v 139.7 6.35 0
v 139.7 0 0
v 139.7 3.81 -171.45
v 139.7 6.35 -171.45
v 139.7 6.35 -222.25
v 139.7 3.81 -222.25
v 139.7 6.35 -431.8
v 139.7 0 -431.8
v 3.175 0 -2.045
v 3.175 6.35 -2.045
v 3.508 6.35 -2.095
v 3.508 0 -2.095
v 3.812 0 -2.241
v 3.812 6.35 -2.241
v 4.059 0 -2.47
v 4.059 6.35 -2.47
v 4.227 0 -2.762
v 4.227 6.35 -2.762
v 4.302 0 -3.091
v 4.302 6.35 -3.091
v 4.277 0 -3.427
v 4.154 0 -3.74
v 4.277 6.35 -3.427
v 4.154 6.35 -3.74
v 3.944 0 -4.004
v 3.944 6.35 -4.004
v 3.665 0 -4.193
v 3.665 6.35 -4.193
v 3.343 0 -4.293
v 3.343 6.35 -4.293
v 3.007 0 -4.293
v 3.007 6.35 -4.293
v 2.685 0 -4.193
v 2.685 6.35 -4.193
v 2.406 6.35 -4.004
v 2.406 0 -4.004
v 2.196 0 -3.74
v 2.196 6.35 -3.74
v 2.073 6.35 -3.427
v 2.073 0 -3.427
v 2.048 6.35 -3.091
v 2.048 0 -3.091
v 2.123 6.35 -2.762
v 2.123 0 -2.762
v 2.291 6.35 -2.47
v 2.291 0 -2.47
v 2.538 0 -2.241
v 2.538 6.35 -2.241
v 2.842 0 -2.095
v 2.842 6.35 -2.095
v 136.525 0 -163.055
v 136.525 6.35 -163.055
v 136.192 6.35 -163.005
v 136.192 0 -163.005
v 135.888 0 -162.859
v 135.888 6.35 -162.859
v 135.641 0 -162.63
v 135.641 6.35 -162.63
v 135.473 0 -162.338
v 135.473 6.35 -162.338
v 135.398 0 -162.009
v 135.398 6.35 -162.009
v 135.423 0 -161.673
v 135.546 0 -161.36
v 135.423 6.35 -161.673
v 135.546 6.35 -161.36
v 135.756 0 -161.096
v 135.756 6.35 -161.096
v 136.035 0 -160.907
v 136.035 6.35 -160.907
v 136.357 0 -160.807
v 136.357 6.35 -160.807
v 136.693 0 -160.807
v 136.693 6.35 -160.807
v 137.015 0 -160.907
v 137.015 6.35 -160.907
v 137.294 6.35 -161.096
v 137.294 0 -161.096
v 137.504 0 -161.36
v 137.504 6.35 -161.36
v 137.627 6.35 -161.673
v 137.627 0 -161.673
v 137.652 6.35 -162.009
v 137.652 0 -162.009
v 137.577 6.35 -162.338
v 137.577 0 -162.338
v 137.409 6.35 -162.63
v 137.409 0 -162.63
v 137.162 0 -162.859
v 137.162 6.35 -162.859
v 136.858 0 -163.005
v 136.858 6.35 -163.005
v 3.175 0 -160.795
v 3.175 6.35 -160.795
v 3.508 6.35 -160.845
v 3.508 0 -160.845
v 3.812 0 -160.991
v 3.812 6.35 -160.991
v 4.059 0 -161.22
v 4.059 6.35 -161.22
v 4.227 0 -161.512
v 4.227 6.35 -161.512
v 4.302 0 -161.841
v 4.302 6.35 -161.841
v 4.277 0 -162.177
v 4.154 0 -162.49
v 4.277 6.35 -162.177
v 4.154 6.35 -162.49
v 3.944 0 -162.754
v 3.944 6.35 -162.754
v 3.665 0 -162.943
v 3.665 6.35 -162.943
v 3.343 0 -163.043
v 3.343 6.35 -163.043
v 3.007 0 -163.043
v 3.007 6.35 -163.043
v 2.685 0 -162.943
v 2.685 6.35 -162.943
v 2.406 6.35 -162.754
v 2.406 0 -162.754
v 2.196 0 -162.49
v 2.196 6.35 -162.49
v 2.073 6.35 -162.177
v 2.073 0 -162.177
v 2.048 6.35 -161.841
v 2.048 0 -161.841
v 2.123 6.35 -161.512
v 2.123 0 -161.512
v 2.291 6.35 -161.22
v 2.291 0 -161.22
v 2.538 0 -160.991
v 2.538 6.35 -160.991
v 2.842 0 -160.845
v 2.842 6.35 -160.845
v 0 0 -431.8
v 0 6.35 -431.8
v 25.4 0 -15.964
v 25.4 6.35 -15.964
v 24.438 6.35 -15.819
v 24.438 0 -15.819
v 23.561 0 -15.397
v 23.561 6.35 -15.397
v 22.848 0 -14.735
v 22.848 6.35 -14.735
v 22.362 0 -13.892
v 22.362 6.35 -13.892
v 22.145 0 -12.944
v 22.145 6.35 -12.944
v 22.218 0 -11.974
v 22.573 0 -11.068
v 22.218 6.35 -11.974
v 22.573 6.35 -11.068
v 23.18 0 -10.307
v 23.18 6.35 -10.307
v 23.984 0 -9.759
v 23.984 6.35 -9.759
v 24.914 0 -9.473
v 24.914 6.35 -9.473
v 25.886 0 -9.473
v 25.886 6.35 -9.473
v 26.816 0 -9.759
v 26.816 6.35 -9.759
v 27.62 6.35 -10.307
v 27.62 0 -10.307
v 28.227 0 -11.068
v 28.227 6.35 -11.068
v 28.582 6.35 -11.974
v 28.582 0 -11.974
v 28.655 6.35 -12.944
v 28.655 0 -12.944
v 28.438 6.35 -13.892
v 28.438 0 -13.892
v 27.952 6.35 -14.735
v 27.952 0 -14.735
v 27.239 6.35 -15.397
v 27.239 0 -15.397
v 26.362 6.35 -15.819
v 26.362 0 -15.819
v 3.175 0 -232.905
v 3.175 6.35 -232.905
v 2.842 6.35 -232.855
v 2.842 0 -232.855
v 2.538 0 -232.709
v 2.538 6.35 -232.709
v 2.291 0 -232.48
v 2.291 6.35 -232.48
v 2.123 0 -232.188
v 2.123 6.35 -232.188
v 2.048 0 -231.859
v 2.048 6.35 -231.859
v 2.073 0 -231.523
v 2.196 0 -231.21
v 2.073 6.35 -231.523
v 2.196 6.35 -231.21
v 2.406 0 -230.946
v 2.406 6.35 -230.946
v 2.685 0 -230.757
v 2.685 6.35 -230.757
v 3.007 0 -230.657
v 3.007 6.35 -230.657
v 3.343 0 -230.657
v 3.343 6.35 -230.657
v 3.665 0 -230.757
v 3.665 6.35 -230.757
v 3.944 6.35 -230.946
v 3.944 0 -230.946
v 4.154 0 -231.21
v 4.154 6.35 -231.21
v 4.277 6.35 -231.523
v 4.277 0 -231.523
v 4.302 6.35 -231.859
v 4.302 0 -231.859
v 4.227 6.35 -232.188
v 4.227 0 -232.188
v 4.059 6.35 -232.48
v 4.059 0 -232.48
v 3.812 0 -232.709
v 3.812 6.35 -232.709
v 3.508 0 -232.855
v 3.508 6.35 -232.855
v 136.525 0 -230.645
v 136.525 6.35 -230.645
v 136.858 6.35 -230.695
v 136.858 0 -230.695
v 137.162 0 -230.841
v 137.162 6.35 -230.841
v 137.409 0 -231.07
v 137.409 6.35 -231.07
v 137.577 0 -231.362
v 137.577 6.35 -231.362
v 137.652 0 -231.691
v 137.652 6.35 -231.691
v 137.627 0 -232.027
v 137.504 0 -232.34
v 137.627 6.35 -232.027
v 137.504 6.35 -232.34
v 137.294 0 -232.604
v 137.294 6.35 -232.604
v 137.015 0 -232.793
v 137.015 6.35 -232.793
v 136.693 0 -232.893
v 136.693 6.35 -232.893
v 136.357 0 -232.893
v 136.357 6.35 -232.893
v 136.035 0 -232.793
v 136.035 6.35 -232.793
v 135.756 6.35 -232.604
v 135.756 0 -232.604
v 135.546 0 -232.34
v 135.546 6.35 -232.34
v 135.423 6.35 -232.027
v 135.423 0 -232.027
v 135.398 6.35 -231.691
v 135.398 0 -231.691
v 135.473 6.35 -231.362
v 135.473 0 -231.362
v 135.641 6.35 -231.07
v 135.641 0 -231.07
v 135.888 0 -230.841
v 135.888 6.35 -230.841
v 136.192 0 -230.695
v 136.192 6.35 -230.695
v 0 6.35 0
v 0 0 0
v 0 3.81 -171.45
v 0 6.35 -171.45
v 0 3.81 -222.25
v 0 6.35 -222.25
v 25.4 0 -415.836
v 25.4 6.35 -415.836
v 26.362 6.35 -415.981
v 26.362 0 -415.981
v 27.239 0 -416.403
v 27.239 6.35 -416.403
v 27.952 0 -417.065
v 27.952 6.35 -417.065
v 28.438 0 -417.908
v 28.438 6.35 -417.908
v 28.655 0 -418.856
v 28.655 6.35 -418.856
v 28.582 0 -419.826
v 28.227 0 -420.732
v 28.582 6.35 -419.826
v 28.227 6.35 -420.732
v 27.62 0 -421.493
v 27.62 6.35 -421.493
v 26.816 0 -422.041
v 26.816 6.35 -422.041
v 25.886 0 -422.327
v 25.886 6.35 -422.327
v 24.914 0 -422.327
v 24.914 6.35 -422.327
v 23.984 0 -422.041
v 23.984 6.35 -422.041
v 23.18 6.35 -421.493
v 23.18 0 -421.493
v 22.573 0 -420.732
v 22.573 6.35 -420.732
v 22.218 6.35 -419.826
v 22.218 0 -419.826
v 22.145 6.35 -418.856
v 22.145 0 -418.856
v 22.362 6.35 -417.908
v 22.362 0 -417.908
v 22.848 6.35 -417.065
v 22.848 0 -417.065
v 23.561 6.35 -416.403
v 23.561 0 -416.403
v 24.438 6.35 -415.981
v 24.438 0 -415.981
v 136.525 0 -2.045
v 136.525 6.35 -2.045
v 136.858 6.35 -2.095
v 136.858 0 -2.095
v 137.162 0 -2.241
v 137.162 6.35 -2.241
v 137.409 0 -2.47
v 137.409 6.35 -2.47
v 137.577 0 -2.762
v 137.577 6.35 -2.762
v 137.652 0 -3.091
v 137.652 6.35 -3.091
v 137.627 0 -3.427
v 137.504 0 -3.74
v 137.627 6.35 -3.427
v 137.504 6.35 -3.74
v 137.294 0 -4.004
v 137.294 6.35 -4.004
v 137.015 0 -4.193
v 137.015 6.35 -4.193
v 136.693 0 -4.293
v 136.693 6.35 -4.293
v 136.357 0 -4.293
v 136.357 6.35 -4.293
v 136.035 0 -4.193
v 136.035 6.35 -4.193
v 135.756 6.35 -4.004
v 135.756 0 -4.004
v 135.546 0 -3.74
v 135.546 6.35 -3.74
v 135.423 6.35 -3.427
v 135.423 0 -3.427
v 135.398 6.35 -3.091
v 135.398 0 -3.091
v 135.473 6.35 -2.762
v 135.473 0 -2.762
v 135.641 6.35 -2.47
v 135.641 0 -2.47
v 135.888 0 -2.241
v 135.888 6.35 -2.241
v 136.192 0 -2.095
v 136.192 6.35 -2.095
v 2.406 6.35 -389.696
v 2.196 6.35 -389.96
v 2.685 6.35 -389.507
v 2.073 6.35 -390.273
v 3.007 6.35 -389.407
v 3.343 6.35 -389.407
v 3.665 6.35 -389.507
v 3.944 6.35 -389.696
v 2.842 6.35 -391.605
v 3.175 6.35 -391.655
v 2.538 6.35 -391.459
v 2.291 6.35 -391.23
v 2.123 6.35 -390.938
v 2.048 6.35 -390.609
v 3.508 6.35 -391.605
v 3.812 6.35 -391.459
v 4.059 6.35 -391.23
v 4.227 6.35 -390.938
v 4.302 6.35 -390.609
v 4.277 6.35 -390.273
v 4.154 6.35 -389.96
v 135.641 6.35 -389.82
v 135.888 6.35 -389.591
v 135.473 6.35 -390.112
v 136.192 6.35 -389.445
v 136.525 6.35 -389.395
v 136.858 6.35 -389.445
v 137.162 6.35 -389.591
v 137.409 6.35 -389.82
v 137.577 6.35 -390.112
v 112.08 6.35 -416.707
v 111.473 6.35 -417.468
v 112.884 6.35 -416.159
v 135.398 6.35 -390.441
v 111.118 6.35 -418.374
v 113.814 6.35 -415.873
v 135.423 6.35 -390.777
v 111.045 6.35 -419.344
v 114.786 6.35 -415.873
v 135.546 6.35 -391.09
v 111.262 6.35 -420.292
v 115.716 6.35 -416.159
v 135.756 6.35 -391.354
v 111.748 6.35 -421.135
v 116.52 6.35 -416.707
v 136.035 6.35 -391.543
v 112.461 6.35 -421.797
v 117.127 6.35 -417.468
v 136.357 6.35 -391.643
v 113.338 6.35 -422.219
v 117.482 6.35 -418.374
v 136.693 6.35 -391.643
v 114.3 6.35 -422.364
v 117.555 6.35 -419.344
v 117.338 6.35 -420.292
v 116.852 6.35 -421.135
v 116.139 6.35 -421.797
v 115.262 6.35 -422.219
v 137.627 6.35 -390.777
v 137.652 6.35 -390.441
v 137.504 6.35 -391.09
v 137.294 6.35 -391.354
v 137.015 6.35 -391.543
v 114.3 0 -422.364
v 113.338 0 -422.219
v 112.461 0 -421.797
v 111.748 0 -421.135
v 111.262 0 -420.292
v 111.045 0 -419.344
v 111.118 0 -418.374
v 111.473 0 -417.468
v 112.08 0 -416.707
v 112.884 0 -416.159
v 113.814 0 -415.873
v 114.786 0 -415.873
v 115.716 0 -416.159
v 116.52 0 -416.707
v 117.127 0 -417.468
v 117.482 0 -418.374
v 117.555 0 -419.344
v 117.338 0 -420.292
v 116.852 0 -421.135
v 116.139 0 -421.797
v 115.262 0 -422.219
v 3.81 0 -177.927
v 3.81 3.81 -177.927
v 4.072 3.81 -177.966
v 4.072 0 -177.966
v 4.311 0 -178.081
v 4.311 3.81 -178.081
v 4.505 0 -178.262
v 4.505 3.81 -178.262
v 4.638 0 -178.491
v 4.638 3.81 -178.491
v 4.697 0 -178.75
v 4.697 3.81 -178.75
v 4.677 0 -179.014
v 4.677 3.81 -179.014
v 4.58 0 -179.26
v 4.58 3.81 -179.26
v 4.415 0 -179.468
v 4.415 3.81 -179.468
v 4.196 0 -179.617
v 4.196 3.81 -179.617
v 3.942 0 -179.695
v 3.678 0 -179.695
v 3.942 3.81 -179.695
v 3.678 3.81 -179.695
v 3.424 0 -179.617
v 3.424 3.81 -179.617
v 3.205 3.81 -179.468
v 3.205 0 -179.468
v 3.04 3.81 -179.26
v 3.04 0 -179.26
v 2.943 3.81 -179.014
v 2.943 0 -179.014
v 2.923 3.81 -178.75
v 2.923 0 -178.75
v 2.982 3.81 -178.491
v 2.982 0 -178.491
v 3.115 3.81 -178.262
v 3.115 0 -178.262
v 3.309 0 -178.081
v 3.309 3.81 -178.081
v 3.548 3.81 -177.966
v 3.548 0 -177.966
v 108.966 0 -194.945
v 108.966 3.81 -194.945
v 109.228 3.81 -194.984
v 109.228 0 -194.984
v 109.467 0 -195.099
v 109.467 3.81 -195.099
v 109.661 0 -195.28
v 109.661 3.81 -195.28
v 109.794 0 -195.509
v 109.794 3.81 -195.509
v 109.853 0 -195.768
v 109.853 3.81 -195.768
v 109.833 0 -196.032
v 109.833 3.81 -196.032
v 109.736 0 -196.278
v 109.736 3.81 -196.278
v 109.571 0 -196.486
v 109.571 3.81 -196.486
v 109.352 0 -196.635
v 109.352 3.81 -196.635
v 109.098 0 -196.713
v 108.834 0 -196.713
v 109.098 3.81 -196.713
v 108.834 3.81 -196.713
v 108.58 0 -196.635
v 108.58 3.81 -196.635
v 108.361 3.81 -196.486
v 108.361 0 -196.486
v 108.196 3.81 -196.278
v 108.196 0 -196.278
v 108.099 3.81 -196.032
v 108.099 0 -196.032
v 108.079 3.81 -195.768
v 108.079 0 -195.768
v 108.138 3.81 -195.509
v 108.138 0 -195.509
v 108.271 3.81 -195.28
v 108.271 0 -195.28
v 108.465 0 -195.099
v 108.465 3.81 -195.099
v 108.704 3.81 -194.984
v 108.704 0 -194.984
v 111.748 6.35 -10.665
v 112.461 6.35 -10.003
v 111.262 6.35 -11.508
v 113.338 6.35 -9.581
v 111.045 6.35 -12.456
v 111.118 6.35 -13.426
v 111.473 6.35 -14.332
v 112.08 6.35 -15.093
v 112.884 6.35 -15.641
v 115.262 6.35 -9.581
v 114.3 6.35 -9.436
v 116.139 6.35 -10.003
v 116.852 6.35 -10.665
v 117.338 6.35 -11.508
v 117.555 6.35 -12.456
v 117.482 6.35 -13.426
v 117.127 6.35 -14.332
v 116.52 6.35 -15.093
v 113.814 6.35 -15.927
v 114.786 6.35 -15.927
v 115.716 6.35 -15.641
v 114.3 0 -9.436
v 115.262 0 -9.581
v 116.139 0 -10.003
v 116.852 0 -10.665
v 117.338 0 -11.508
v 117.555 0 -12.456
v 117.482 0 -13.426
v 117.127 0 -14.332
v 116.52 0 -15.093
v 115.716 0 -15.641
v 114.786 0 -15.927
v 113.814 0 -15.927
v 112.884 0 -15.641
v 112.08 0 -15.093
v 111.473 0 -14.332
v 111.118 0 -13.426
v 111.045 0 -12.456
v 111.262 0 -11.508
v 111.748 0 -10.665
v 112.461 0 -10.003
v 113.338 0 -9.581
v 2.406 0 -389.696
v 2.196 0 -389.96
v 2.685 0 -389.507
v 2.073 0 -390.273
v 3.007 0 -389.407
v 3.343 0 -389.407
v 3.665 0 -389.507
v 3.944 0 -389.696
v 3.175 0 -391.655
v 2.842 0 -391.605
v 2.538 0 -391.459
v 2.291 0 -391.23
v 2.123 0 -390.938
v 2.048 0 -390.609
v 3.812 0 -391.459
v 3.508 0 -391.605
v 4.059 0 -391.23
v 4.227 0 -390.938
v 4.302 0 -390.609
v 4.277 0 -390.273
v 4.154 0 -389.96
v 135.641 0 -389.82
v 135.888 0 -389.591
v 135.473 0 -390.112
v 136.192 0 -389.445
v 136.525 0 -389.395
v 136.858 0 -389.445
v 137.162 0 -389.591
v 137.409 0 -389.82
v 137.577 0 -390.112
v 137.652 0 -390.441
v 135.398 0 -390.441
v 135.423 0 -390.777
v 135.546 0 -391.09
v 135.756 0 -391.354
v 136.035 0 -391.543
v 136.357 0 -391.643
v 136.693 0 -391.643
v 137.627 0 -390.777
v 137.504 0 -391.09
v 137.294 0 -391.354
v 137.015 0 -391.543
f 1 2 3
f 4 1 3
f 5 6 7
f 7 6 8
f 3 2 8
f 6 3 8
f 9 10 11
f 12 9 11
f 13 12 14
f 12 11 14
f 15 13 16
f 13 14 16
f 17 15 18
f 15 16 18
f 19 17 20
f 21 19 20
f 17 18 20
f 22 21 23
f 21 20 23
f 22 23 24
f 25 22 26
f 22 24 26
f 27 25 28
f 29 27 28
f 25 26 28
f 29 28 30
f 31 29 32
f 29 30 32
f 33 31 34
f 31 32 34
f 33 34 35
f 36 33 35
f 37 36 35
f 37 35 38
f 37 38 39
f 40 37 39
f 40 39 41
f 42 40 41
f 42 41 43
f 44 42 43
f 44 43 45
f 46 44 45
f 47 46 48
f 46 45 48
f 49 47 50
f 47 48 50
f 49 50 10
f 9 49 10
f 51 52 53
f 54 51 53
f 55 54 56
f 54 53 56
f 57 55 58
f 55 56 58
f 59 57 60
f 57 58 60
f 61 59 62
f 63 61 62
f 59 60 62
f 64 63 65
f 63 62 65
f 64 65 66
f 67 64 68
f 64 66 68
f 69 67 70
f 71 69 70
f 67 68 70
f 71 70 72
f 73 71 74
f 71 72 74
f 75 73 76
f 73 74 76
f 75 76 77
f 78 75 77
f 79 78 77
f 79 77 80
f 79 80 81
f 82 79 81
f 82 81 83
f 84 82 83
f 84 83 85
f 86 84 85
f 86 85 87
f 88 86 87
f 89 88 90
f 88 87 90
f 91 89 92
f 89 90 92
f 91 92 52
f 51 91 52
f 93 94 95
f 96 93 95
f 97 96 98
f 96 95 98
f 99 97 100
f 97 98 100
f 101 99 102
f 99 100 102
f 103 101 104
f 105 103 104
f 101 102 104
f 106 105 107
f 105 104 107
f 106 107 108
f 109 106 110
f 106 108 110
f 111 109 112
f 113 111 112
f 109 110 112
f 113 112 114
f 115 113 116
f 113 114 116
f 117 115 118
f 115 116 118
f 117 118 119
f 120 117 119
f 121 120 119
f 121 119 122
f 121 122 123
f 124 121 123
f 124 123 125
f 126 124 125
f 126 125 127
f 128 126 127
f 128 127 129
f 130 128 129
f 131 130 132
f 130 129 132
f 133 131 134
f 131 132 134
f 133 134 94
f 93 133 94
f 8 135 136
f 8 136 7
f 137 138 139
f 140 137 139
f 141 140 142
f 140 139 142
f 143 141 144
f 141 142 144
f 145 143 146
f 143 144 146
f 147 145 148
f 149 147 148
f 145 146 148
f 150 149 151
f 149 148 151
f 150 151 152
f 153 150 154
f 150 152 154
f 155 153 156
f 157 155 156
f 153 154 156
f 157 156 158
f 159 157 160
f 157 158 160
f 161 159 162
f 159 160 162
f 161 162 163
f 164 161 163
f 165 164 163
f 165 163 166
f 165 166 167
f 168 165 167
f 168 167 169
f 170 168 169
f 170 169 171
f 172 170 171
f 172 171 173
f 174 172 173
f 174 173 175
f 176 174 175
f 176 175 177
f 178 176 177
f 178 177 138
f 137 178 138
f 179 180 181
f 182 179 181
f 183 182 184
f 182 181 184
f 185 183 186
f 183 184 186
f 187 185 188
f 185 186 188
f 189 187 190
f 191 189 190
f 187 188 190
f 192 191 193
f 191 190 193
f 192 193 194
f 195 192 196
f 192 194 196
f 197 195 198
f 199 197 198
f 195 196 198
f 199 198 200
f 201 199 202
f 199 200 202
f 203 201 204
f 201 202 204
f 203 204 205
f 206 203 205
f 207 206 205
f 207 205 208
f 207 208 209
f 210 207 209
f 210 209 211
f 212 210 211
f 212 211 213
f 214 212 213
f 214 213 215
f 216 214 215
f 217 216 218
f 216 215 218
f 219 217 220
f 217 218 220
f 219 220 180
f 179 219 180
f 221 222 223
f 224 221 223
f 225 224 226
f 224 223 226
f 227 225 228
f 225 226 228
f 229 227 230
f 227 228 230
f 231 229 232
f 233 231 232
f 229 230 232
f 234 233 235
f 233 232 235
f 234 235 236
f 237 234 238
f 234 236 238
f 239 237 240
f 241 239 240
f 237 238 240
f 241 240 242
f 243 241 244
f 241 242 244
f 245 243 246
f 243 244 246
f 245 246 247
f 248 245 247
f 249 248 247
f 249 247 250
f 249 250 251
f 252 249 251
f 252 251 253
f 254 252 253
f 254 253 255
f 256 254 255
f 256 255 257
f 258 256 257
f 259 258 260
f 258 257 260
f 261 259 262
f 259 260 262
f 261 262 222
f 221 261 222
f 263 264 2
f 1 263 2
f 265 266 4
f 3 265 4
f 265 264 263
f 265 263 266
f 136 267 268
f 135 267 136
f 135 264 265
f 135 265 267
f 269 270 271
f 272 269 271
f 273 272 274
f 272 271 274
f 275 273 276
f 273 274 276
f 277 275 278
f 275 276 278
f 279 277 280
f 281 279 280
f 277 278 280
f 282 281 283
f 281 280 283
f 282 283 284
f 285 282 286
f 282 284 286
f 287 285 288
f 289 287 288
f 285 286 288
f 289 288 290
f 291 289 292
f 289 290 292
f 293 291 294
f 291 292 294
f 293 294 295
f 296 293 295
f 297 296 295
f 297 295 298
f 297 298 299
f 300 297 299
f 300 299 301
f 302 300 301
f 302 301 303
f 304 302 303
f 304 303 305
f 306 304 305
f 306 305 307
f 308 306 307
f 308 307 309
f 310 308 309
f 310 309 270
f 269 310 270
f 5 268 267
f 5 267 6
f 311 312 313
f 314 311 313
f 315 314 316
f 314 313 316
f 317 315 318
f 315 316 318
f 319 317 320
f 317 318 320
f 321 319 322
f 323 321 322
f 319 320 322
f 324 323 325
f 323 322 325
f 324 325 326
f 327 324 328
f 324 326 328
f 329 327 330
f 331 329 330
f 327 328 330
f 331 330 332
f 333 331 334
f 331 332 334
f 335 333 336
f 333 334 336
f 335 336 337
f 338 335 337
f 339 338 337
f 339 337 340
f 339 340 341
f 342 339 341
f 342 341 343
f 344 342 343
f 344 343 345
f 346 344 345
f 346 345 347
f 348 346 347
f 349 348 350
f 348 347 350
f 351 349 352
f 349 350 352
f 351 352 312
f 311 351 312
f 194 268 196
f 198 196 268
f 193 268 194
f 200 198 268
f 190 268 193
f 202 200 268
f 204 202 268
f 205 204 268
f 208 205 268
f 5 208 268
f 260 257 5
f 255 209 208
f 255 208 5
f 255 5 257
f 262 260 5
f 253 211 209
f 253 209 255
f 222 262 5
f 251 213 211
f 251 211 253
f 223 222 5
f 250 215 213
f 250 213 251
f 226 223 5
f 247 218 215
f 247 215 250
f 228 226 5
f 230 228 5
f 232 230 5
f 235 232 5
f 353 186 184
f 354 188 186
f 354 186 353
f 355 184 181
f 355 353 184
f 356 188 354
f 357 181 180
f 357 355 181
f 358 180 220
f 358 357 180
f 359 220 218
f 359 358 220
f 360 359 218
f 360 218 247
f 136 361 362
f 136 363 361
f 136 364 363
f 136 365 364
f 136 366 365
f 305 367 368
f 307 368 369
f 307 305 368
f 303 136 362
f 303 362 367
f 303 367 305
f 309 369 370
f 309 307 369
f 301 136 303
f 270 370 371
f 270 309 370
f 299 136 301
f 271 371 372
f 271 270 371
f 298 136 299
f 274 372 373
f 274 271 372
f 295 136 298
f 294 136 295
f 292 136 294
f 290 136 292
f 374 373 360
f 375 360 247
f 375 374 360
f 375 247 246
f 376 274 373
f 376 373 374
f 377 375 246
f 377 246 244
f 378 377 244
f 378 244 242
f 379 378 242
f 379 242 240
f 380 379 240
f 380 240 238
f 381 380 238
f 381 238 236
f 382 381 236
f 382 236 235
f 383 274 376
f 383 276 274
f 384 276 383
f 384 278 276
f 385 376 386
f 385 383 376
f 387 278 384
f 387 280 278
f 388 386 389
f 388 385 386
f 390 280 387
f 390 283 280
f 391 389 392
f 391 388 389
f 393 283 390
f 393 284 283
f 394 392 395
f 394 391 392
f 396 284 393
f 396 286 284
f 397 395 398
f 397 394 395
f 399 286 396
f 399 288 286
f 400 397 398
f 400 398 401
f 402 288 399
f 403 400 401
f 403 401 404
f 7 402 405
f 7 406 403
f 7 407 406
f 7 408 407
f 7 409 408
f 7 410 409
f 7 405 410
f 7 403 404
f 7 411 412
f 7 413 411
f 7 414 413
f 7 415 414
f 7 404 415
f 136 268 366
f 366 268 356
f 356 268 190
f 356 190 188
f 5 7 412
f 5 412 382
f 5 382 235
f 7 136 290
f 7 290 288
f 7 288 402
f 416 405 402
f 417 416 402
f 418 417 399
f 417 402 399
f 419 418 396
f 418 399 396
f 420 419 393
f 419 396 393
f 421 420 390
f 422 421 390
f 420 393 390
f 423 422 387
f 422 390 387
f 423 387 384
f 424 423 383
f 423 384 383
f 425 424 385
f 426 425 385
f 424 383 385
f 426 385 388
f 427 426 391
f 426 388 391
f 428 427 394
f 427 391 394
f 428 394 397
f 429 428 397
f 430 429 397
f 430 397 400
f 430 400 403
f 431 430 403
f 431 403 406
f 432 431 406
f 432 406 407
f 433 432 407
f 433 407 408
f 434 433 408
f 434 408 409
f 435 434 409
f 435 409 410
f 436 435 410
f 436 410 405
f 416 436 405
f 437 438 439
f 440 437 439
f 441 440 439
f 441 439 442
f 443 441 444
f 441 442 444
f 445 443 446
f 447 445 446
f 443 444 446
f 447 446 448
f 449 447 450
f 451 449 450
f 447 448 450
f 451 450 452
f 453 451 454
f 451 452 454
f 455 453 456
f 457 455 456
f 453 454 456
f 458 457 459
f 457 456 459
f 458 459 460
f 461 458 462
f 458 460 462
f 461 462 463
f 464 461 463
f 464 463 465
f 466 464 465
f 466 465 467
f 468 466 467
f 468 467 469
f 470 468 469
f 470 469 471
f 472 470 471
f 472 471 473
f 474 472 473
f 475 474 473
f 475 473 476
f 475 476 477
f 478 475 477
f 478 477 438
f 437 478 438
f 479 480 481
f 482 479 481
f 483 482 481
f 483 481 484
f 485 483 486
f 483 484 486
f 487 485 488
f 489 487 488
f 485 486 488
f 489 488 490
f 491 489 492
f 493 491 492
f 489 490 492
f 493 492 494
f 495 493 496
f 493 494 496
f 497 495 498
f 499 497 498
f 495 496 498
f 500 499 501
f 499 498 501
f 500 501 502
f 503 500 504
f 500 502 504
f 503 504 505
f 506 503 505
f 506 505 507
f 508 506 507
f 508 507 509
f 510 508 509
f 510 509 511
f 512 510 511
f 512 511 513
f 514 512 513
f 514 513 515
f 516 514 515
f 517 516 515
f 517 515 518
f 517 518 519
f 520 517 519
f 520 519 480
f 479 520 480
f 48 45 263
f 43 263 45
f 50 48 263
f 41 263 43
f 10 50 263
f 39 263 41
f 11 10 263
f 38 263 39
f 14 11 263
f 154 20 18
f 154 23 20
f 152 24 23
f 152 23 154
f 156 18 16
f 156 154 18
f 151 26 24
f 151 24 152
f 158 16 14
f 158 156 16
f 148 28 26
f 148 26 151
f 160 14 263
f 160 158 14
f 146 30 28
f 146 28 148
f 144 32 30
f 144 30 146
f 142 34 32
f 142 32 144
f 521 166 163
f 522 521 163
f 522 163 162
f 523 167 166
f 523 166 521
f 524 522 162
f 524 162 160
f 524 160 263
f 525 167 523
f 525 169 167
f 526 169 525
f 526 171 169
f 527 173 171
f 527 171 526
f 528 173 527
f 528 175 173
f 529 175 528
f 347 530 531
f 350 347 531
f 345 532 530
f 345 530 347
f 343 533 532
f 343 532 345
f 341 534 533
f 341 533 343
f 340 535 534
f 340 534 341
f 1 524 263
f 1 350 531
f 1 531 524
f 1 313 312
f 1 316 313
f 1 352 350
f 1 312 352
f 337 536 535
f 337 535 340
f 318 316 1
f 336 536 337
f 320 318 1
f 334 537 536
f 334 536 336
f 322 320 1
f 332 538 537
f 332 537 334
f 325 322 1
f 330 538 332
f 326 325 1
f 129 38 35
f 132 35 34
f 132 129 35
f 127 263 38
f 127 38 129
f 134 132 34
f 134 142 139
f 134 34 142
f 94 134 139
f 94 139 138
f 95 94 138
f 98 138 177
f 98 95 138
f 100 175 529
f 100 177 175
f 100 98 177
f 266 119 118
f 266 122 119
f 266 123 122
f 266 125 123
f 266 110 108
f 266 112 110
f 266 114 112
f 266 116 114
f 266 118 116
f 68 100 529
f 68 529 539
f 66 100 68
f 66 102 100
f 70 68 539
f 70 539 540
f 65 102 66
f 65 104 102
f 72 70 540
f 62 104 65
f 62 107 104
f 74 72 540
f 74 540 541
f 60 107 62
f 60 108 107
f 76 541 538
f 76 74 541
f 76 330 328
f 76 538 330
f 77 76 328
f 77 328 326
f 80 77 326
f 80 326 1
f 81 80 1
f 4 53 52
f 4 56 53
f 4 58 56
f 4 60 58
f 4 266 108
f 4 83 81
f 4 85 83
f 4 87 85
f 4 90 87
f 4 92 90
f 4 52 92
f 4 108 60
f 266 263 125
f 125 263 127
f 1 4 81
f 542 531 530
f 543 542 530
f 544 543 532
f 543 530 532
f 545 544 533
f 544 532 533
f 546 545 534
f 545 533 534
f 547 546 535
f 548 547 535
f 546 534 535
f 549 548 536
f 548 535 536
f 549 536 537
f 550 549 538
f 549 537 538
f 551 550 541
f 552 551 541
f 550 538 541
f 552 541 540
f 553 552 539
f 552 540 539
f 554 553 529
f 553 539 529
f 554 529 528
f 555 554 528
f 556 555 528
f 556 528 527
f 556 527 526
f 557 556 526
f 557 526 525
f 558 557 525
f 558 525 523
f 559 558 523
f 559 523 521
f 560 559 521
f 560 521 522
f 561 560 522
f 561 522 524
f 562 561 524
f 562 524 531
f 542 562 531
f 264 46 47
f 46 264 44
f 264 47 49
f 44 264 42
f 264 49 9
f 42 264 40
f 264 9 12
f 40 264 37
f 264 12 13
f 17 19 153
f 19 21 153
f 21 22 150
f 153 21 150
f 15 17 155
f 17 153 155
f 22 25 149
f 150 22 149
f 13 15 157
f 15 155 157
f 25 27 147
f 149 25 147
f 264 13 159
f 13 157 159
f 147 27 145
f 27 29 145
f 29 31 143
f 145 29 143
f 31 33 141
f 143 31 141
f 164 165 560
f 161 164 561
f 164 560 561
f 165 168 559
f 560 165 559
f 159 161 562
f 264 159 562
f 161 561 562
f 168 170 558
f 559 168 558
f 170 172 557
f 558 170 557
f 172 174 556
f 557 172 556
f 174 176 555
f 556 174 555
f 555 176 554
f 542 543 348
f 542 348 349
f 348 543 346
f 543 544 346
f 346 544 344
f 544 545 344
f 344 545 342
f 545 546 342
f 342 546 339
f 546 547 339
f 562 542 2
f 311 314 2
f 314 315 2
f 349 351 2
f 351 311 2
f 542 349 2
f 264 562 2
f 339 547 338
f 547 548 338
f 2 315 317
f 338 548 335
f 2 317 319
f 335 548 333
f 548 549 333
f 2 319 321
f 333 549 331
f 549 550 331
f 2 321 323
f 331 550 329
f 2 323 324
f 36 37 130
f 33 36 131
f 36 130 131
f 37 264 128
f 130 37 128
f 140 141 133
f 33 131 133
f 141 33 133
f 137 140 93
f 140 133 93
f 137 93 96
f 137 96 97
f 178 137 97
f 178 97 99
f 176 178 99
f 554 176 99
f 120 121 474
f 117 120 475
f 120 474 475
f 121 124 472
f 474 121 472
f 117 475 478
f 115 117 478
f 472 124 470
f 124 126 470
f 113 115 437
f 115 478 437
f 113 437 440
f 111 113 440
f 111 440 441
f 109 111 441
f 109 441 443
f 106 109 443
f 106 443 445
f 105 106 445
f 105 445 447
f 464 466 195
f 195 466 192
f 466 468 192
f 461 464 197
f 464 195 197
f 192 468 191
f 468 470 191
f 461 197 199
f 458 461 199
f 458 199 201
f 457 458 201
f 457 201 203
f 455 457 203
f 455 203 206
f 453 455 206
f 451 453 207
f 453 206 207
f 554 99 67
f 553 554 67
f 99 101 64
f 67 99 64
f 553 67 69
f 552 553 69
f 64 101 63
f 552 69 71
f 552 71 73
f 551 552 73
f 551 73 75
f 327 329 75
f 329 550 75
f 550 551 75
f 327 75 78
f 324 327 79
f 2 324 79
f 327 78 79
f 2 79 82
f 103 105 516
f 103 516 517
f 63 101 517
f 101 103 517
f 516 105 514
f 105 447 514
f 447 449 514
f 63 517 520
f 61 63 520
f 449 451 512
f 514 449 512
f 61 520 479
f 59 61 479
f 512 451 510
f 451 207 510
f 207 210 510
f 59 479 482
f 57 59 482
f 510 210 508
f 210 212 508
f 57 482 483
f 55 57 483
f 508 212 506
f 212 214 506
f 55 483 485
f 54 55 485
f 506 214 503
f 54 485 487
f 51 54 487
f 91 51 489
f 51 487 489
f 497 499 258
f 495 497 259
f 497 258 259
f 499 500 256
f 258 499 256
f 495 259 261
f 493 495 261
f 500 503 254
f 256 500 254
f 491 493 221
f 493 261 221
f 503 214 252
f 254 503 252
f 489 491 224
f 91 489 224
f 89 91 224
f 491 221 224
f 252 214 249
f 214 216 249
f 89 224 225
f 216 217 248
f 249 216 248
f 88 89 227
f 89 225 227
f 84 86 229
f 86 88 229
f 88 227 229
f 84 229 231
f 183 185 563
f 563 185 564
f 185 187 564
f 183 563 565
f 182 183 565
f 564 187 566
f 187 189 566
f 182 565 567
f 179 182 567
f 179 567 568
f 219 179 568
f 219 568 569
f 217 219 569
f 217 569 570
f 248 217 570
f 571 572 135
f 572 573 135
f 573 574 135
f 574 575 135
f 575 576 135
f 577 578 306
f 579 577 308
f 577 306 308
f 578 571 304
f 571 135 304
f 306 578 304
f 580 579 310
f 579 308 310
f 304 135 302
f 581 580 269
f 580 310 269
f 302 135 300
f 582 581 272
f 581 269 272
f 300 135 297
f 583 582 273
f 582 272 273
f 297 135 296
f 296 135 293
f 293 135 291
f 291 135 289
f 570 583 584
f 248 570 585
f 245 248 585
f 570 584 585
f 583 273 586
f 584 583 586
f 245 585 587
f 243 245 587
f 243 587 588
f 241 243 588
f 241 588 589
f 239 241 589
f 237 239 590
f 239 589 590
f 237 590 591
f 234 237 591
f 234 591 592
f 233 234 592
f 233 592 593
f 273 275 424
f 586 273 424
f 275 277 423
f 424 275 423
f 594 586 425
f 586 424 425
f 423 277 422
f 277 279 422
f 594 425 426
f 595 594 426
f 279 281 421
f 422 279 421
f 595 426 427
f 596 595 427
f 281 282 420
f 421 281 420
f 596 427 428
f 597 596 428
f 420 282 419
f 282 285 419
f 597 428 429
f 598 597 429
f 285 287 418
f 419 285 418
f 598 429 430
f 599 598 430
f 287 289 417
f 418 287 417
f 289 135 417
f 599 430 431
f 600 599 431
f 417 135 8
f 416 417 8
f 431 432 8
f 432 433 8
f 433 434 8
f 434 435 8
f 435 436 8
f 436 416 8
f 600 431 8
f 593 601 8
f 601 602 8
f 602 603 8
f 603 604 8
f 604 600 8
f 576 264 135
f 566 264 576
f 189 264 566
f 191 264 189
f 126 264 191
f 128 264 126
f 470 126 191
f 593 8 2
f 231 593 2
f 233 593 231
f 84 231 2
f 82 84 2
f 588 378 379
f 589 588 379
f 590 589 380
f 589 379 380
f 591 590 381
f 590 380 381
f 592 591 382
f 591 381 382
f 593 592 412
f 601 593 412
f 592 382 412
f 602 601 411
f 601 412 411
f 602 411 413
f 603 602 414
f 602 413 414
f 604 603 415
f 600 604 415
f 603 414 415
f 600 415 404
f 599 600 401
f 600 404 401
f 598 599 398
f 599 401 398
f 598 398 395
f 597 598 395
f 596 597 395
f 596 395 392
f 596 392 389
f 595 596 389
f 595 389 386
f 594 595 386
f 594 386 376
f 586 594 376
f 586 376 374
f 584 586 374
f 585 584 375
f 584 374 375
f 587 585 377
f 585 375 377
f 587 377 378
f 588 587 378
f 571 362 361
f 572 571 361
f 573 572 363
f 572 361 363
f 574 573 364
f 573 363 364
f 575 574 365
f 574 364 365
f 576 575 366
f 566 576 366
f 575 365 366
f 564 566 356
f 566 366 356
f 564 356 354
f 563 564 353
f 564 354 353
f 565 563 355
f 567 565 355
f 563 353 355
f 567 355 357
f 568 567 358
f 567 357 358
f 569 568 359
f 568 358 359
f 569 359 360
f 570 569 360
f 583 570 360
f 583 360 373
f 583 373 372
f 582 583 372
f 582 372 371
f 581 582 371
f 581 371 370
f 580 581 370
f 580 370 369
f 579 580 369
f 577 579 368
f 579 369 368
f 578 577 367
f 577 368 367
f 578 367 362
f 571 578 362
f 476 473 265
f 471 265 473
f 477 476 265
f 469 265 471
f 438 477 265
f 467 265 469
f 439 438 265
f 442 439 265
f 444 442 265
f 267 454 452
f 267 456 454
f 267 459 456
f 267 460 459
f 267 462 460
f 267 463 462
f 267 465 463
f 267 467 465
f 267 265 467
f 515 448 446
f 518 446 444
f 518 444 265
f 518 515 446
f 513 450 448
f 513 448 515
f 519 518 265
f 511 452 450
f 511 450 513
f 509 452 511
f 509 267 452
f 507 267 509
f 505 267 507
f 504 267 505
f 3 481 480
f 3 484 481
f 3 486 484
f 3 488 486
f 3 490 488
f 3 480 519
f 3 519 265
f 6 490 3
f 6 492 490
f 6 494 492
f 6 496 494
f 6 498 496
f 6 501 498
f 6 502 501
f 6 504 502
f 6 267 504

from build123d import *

# Parameters (mm, degrees)
SKETCH1_W           = 139.7
SKETCH1_H           = 431.8
BOSS_EXTRUDE1_DEPTH = 6.35
SKETCH3_R           = 1.1303
CUT_EXTRUDE6_DEPTH  = 6.35
SKETCH4_W           = 139.7
SKETCH4_H           = 50.8
CUT_EXTRUDE7_DEPTH  = 2.54
SKETCH5_R           = 0.889
CUT_EXTRUDE8_DEPTH  = 454.852229365
SKETCH6_R           = 3.2639
CUT_EXTRUDE9_DEPTH  = 454.880658874


with BuildPart() as part:
    # Sketch1 → Boss-Extrude1 (new body)
    with BuildSketch(Plane(origin=(0, 0, 0), x_dir=(1, 0, 0), z_dir=(0, 1, 0))):
        with Locations((69.85, 215.9)):
            Rectangle(SKETCH1_W, SKETCH1_H)
    extrude(amount=BOSS_EXTRUDE1_DEPTH)

    # Sketch3 → Cut-Extrude6 (cut)
    with BuildSketch(Plane(origin=(0, 6.35, 0), x_dir=(1, 0, 0), z_dir=(0, 1, 0))):
        with Locations(Location((3.175, 3.175, 0), (0, 0, 270))):
            Circle(SKETCH3_R)
        with Locations(Location((136.525, 3.175, 0), (0, 0, 270))):
            Circle(SKETCH3_R)
        with Locations(Location((136.525, 161.925, 0), (0, 0, 90))):
            Circle(SKETCH3_R)
        with Locations(Location((136.525, 231.775, 0), (0, 0, 270))):
            Circle(SKETCH3_R)
        with Locations(Location((3.175, 161.925, 0), (0, 0, 270))):
            Circle(SKETCH3_R)
        with Locations(Location((3.175, 231.775, 0), (0, 0, 90))):
            Circle(SKETCH3_R)
        with Locations(Location((3.175, 390.525, 0), (0, 0, 90))):
            Circle(SKETCH3_R)
        with Locations(Location((136.525, 390.525, 0), (0, 0, 270))):
            Circle(SKETCH3_R)
    extrude(amount=-CUT_EXTRUDE6_DEPTH, mode=Mode.SUBTRACT)

    # Sketch4 → Cut-Extrude7 (cut)
    with BuildSketch(Plane(origin=(0, 6.35, 0), x_dir=(1, 0, 0), z_dir=(0, 1, 0))):
        with Locations((69.85, 196.85)):
            Rectangle(SKETCH4_W, SKETCH4_H)
    extrude(amount=-CUT_EXTRUDE7_DEPTH, mode=Mode.SUBTRACT)

    # Sketch5 → Cut-Extrude8 (cut, through all)
    with BuildSketch(Plane(origin=(0, 3.81, 0), x_dir=(1, 0, 0), z_dir=(0, 1, 0))):
        with Locations(Location((3.81, 178.816, 0), (0, 0, 270))):
            Circle(SKETCH5_R)
        with Locations(Location((108.966, 195.834, 0), (0, 0, 270))):
            Circle(SKETCH5_R)
    extrude(amount=-CUT_EXTRUDE8_DEPTH, mode=Mode.SUBTRACT)

    # Sketch6 → Cut-Extrude9 (cut, through all)
    with BuildSketch(Plane(origin=(0, 6.35, 0), x_dir=(1, 0, 0), z_dir=(0, 1, 0))):
        with Locations(Location((25.4, 419.1, 0), (0, 0, 270))):
            Circle(SKETCH6_R)
        with Locations(Location((114.3, 419.1, 0), (0, 0, 90))):
            Circle(SKETCH6_R)
        with Locations(Location((114.3, 12.7, 0), (0, 0, 270))):
            Circle(SKETCH6_R)
        with Locations(Location((25.4, 12.7, 0), (0, 0, 90))):
            Circle(SKETCH6_R)
    extrude(amount=-CUT_EXTRUDE9_DEPTH, mode=Mode.SUBTRACT)


solid = part.part
